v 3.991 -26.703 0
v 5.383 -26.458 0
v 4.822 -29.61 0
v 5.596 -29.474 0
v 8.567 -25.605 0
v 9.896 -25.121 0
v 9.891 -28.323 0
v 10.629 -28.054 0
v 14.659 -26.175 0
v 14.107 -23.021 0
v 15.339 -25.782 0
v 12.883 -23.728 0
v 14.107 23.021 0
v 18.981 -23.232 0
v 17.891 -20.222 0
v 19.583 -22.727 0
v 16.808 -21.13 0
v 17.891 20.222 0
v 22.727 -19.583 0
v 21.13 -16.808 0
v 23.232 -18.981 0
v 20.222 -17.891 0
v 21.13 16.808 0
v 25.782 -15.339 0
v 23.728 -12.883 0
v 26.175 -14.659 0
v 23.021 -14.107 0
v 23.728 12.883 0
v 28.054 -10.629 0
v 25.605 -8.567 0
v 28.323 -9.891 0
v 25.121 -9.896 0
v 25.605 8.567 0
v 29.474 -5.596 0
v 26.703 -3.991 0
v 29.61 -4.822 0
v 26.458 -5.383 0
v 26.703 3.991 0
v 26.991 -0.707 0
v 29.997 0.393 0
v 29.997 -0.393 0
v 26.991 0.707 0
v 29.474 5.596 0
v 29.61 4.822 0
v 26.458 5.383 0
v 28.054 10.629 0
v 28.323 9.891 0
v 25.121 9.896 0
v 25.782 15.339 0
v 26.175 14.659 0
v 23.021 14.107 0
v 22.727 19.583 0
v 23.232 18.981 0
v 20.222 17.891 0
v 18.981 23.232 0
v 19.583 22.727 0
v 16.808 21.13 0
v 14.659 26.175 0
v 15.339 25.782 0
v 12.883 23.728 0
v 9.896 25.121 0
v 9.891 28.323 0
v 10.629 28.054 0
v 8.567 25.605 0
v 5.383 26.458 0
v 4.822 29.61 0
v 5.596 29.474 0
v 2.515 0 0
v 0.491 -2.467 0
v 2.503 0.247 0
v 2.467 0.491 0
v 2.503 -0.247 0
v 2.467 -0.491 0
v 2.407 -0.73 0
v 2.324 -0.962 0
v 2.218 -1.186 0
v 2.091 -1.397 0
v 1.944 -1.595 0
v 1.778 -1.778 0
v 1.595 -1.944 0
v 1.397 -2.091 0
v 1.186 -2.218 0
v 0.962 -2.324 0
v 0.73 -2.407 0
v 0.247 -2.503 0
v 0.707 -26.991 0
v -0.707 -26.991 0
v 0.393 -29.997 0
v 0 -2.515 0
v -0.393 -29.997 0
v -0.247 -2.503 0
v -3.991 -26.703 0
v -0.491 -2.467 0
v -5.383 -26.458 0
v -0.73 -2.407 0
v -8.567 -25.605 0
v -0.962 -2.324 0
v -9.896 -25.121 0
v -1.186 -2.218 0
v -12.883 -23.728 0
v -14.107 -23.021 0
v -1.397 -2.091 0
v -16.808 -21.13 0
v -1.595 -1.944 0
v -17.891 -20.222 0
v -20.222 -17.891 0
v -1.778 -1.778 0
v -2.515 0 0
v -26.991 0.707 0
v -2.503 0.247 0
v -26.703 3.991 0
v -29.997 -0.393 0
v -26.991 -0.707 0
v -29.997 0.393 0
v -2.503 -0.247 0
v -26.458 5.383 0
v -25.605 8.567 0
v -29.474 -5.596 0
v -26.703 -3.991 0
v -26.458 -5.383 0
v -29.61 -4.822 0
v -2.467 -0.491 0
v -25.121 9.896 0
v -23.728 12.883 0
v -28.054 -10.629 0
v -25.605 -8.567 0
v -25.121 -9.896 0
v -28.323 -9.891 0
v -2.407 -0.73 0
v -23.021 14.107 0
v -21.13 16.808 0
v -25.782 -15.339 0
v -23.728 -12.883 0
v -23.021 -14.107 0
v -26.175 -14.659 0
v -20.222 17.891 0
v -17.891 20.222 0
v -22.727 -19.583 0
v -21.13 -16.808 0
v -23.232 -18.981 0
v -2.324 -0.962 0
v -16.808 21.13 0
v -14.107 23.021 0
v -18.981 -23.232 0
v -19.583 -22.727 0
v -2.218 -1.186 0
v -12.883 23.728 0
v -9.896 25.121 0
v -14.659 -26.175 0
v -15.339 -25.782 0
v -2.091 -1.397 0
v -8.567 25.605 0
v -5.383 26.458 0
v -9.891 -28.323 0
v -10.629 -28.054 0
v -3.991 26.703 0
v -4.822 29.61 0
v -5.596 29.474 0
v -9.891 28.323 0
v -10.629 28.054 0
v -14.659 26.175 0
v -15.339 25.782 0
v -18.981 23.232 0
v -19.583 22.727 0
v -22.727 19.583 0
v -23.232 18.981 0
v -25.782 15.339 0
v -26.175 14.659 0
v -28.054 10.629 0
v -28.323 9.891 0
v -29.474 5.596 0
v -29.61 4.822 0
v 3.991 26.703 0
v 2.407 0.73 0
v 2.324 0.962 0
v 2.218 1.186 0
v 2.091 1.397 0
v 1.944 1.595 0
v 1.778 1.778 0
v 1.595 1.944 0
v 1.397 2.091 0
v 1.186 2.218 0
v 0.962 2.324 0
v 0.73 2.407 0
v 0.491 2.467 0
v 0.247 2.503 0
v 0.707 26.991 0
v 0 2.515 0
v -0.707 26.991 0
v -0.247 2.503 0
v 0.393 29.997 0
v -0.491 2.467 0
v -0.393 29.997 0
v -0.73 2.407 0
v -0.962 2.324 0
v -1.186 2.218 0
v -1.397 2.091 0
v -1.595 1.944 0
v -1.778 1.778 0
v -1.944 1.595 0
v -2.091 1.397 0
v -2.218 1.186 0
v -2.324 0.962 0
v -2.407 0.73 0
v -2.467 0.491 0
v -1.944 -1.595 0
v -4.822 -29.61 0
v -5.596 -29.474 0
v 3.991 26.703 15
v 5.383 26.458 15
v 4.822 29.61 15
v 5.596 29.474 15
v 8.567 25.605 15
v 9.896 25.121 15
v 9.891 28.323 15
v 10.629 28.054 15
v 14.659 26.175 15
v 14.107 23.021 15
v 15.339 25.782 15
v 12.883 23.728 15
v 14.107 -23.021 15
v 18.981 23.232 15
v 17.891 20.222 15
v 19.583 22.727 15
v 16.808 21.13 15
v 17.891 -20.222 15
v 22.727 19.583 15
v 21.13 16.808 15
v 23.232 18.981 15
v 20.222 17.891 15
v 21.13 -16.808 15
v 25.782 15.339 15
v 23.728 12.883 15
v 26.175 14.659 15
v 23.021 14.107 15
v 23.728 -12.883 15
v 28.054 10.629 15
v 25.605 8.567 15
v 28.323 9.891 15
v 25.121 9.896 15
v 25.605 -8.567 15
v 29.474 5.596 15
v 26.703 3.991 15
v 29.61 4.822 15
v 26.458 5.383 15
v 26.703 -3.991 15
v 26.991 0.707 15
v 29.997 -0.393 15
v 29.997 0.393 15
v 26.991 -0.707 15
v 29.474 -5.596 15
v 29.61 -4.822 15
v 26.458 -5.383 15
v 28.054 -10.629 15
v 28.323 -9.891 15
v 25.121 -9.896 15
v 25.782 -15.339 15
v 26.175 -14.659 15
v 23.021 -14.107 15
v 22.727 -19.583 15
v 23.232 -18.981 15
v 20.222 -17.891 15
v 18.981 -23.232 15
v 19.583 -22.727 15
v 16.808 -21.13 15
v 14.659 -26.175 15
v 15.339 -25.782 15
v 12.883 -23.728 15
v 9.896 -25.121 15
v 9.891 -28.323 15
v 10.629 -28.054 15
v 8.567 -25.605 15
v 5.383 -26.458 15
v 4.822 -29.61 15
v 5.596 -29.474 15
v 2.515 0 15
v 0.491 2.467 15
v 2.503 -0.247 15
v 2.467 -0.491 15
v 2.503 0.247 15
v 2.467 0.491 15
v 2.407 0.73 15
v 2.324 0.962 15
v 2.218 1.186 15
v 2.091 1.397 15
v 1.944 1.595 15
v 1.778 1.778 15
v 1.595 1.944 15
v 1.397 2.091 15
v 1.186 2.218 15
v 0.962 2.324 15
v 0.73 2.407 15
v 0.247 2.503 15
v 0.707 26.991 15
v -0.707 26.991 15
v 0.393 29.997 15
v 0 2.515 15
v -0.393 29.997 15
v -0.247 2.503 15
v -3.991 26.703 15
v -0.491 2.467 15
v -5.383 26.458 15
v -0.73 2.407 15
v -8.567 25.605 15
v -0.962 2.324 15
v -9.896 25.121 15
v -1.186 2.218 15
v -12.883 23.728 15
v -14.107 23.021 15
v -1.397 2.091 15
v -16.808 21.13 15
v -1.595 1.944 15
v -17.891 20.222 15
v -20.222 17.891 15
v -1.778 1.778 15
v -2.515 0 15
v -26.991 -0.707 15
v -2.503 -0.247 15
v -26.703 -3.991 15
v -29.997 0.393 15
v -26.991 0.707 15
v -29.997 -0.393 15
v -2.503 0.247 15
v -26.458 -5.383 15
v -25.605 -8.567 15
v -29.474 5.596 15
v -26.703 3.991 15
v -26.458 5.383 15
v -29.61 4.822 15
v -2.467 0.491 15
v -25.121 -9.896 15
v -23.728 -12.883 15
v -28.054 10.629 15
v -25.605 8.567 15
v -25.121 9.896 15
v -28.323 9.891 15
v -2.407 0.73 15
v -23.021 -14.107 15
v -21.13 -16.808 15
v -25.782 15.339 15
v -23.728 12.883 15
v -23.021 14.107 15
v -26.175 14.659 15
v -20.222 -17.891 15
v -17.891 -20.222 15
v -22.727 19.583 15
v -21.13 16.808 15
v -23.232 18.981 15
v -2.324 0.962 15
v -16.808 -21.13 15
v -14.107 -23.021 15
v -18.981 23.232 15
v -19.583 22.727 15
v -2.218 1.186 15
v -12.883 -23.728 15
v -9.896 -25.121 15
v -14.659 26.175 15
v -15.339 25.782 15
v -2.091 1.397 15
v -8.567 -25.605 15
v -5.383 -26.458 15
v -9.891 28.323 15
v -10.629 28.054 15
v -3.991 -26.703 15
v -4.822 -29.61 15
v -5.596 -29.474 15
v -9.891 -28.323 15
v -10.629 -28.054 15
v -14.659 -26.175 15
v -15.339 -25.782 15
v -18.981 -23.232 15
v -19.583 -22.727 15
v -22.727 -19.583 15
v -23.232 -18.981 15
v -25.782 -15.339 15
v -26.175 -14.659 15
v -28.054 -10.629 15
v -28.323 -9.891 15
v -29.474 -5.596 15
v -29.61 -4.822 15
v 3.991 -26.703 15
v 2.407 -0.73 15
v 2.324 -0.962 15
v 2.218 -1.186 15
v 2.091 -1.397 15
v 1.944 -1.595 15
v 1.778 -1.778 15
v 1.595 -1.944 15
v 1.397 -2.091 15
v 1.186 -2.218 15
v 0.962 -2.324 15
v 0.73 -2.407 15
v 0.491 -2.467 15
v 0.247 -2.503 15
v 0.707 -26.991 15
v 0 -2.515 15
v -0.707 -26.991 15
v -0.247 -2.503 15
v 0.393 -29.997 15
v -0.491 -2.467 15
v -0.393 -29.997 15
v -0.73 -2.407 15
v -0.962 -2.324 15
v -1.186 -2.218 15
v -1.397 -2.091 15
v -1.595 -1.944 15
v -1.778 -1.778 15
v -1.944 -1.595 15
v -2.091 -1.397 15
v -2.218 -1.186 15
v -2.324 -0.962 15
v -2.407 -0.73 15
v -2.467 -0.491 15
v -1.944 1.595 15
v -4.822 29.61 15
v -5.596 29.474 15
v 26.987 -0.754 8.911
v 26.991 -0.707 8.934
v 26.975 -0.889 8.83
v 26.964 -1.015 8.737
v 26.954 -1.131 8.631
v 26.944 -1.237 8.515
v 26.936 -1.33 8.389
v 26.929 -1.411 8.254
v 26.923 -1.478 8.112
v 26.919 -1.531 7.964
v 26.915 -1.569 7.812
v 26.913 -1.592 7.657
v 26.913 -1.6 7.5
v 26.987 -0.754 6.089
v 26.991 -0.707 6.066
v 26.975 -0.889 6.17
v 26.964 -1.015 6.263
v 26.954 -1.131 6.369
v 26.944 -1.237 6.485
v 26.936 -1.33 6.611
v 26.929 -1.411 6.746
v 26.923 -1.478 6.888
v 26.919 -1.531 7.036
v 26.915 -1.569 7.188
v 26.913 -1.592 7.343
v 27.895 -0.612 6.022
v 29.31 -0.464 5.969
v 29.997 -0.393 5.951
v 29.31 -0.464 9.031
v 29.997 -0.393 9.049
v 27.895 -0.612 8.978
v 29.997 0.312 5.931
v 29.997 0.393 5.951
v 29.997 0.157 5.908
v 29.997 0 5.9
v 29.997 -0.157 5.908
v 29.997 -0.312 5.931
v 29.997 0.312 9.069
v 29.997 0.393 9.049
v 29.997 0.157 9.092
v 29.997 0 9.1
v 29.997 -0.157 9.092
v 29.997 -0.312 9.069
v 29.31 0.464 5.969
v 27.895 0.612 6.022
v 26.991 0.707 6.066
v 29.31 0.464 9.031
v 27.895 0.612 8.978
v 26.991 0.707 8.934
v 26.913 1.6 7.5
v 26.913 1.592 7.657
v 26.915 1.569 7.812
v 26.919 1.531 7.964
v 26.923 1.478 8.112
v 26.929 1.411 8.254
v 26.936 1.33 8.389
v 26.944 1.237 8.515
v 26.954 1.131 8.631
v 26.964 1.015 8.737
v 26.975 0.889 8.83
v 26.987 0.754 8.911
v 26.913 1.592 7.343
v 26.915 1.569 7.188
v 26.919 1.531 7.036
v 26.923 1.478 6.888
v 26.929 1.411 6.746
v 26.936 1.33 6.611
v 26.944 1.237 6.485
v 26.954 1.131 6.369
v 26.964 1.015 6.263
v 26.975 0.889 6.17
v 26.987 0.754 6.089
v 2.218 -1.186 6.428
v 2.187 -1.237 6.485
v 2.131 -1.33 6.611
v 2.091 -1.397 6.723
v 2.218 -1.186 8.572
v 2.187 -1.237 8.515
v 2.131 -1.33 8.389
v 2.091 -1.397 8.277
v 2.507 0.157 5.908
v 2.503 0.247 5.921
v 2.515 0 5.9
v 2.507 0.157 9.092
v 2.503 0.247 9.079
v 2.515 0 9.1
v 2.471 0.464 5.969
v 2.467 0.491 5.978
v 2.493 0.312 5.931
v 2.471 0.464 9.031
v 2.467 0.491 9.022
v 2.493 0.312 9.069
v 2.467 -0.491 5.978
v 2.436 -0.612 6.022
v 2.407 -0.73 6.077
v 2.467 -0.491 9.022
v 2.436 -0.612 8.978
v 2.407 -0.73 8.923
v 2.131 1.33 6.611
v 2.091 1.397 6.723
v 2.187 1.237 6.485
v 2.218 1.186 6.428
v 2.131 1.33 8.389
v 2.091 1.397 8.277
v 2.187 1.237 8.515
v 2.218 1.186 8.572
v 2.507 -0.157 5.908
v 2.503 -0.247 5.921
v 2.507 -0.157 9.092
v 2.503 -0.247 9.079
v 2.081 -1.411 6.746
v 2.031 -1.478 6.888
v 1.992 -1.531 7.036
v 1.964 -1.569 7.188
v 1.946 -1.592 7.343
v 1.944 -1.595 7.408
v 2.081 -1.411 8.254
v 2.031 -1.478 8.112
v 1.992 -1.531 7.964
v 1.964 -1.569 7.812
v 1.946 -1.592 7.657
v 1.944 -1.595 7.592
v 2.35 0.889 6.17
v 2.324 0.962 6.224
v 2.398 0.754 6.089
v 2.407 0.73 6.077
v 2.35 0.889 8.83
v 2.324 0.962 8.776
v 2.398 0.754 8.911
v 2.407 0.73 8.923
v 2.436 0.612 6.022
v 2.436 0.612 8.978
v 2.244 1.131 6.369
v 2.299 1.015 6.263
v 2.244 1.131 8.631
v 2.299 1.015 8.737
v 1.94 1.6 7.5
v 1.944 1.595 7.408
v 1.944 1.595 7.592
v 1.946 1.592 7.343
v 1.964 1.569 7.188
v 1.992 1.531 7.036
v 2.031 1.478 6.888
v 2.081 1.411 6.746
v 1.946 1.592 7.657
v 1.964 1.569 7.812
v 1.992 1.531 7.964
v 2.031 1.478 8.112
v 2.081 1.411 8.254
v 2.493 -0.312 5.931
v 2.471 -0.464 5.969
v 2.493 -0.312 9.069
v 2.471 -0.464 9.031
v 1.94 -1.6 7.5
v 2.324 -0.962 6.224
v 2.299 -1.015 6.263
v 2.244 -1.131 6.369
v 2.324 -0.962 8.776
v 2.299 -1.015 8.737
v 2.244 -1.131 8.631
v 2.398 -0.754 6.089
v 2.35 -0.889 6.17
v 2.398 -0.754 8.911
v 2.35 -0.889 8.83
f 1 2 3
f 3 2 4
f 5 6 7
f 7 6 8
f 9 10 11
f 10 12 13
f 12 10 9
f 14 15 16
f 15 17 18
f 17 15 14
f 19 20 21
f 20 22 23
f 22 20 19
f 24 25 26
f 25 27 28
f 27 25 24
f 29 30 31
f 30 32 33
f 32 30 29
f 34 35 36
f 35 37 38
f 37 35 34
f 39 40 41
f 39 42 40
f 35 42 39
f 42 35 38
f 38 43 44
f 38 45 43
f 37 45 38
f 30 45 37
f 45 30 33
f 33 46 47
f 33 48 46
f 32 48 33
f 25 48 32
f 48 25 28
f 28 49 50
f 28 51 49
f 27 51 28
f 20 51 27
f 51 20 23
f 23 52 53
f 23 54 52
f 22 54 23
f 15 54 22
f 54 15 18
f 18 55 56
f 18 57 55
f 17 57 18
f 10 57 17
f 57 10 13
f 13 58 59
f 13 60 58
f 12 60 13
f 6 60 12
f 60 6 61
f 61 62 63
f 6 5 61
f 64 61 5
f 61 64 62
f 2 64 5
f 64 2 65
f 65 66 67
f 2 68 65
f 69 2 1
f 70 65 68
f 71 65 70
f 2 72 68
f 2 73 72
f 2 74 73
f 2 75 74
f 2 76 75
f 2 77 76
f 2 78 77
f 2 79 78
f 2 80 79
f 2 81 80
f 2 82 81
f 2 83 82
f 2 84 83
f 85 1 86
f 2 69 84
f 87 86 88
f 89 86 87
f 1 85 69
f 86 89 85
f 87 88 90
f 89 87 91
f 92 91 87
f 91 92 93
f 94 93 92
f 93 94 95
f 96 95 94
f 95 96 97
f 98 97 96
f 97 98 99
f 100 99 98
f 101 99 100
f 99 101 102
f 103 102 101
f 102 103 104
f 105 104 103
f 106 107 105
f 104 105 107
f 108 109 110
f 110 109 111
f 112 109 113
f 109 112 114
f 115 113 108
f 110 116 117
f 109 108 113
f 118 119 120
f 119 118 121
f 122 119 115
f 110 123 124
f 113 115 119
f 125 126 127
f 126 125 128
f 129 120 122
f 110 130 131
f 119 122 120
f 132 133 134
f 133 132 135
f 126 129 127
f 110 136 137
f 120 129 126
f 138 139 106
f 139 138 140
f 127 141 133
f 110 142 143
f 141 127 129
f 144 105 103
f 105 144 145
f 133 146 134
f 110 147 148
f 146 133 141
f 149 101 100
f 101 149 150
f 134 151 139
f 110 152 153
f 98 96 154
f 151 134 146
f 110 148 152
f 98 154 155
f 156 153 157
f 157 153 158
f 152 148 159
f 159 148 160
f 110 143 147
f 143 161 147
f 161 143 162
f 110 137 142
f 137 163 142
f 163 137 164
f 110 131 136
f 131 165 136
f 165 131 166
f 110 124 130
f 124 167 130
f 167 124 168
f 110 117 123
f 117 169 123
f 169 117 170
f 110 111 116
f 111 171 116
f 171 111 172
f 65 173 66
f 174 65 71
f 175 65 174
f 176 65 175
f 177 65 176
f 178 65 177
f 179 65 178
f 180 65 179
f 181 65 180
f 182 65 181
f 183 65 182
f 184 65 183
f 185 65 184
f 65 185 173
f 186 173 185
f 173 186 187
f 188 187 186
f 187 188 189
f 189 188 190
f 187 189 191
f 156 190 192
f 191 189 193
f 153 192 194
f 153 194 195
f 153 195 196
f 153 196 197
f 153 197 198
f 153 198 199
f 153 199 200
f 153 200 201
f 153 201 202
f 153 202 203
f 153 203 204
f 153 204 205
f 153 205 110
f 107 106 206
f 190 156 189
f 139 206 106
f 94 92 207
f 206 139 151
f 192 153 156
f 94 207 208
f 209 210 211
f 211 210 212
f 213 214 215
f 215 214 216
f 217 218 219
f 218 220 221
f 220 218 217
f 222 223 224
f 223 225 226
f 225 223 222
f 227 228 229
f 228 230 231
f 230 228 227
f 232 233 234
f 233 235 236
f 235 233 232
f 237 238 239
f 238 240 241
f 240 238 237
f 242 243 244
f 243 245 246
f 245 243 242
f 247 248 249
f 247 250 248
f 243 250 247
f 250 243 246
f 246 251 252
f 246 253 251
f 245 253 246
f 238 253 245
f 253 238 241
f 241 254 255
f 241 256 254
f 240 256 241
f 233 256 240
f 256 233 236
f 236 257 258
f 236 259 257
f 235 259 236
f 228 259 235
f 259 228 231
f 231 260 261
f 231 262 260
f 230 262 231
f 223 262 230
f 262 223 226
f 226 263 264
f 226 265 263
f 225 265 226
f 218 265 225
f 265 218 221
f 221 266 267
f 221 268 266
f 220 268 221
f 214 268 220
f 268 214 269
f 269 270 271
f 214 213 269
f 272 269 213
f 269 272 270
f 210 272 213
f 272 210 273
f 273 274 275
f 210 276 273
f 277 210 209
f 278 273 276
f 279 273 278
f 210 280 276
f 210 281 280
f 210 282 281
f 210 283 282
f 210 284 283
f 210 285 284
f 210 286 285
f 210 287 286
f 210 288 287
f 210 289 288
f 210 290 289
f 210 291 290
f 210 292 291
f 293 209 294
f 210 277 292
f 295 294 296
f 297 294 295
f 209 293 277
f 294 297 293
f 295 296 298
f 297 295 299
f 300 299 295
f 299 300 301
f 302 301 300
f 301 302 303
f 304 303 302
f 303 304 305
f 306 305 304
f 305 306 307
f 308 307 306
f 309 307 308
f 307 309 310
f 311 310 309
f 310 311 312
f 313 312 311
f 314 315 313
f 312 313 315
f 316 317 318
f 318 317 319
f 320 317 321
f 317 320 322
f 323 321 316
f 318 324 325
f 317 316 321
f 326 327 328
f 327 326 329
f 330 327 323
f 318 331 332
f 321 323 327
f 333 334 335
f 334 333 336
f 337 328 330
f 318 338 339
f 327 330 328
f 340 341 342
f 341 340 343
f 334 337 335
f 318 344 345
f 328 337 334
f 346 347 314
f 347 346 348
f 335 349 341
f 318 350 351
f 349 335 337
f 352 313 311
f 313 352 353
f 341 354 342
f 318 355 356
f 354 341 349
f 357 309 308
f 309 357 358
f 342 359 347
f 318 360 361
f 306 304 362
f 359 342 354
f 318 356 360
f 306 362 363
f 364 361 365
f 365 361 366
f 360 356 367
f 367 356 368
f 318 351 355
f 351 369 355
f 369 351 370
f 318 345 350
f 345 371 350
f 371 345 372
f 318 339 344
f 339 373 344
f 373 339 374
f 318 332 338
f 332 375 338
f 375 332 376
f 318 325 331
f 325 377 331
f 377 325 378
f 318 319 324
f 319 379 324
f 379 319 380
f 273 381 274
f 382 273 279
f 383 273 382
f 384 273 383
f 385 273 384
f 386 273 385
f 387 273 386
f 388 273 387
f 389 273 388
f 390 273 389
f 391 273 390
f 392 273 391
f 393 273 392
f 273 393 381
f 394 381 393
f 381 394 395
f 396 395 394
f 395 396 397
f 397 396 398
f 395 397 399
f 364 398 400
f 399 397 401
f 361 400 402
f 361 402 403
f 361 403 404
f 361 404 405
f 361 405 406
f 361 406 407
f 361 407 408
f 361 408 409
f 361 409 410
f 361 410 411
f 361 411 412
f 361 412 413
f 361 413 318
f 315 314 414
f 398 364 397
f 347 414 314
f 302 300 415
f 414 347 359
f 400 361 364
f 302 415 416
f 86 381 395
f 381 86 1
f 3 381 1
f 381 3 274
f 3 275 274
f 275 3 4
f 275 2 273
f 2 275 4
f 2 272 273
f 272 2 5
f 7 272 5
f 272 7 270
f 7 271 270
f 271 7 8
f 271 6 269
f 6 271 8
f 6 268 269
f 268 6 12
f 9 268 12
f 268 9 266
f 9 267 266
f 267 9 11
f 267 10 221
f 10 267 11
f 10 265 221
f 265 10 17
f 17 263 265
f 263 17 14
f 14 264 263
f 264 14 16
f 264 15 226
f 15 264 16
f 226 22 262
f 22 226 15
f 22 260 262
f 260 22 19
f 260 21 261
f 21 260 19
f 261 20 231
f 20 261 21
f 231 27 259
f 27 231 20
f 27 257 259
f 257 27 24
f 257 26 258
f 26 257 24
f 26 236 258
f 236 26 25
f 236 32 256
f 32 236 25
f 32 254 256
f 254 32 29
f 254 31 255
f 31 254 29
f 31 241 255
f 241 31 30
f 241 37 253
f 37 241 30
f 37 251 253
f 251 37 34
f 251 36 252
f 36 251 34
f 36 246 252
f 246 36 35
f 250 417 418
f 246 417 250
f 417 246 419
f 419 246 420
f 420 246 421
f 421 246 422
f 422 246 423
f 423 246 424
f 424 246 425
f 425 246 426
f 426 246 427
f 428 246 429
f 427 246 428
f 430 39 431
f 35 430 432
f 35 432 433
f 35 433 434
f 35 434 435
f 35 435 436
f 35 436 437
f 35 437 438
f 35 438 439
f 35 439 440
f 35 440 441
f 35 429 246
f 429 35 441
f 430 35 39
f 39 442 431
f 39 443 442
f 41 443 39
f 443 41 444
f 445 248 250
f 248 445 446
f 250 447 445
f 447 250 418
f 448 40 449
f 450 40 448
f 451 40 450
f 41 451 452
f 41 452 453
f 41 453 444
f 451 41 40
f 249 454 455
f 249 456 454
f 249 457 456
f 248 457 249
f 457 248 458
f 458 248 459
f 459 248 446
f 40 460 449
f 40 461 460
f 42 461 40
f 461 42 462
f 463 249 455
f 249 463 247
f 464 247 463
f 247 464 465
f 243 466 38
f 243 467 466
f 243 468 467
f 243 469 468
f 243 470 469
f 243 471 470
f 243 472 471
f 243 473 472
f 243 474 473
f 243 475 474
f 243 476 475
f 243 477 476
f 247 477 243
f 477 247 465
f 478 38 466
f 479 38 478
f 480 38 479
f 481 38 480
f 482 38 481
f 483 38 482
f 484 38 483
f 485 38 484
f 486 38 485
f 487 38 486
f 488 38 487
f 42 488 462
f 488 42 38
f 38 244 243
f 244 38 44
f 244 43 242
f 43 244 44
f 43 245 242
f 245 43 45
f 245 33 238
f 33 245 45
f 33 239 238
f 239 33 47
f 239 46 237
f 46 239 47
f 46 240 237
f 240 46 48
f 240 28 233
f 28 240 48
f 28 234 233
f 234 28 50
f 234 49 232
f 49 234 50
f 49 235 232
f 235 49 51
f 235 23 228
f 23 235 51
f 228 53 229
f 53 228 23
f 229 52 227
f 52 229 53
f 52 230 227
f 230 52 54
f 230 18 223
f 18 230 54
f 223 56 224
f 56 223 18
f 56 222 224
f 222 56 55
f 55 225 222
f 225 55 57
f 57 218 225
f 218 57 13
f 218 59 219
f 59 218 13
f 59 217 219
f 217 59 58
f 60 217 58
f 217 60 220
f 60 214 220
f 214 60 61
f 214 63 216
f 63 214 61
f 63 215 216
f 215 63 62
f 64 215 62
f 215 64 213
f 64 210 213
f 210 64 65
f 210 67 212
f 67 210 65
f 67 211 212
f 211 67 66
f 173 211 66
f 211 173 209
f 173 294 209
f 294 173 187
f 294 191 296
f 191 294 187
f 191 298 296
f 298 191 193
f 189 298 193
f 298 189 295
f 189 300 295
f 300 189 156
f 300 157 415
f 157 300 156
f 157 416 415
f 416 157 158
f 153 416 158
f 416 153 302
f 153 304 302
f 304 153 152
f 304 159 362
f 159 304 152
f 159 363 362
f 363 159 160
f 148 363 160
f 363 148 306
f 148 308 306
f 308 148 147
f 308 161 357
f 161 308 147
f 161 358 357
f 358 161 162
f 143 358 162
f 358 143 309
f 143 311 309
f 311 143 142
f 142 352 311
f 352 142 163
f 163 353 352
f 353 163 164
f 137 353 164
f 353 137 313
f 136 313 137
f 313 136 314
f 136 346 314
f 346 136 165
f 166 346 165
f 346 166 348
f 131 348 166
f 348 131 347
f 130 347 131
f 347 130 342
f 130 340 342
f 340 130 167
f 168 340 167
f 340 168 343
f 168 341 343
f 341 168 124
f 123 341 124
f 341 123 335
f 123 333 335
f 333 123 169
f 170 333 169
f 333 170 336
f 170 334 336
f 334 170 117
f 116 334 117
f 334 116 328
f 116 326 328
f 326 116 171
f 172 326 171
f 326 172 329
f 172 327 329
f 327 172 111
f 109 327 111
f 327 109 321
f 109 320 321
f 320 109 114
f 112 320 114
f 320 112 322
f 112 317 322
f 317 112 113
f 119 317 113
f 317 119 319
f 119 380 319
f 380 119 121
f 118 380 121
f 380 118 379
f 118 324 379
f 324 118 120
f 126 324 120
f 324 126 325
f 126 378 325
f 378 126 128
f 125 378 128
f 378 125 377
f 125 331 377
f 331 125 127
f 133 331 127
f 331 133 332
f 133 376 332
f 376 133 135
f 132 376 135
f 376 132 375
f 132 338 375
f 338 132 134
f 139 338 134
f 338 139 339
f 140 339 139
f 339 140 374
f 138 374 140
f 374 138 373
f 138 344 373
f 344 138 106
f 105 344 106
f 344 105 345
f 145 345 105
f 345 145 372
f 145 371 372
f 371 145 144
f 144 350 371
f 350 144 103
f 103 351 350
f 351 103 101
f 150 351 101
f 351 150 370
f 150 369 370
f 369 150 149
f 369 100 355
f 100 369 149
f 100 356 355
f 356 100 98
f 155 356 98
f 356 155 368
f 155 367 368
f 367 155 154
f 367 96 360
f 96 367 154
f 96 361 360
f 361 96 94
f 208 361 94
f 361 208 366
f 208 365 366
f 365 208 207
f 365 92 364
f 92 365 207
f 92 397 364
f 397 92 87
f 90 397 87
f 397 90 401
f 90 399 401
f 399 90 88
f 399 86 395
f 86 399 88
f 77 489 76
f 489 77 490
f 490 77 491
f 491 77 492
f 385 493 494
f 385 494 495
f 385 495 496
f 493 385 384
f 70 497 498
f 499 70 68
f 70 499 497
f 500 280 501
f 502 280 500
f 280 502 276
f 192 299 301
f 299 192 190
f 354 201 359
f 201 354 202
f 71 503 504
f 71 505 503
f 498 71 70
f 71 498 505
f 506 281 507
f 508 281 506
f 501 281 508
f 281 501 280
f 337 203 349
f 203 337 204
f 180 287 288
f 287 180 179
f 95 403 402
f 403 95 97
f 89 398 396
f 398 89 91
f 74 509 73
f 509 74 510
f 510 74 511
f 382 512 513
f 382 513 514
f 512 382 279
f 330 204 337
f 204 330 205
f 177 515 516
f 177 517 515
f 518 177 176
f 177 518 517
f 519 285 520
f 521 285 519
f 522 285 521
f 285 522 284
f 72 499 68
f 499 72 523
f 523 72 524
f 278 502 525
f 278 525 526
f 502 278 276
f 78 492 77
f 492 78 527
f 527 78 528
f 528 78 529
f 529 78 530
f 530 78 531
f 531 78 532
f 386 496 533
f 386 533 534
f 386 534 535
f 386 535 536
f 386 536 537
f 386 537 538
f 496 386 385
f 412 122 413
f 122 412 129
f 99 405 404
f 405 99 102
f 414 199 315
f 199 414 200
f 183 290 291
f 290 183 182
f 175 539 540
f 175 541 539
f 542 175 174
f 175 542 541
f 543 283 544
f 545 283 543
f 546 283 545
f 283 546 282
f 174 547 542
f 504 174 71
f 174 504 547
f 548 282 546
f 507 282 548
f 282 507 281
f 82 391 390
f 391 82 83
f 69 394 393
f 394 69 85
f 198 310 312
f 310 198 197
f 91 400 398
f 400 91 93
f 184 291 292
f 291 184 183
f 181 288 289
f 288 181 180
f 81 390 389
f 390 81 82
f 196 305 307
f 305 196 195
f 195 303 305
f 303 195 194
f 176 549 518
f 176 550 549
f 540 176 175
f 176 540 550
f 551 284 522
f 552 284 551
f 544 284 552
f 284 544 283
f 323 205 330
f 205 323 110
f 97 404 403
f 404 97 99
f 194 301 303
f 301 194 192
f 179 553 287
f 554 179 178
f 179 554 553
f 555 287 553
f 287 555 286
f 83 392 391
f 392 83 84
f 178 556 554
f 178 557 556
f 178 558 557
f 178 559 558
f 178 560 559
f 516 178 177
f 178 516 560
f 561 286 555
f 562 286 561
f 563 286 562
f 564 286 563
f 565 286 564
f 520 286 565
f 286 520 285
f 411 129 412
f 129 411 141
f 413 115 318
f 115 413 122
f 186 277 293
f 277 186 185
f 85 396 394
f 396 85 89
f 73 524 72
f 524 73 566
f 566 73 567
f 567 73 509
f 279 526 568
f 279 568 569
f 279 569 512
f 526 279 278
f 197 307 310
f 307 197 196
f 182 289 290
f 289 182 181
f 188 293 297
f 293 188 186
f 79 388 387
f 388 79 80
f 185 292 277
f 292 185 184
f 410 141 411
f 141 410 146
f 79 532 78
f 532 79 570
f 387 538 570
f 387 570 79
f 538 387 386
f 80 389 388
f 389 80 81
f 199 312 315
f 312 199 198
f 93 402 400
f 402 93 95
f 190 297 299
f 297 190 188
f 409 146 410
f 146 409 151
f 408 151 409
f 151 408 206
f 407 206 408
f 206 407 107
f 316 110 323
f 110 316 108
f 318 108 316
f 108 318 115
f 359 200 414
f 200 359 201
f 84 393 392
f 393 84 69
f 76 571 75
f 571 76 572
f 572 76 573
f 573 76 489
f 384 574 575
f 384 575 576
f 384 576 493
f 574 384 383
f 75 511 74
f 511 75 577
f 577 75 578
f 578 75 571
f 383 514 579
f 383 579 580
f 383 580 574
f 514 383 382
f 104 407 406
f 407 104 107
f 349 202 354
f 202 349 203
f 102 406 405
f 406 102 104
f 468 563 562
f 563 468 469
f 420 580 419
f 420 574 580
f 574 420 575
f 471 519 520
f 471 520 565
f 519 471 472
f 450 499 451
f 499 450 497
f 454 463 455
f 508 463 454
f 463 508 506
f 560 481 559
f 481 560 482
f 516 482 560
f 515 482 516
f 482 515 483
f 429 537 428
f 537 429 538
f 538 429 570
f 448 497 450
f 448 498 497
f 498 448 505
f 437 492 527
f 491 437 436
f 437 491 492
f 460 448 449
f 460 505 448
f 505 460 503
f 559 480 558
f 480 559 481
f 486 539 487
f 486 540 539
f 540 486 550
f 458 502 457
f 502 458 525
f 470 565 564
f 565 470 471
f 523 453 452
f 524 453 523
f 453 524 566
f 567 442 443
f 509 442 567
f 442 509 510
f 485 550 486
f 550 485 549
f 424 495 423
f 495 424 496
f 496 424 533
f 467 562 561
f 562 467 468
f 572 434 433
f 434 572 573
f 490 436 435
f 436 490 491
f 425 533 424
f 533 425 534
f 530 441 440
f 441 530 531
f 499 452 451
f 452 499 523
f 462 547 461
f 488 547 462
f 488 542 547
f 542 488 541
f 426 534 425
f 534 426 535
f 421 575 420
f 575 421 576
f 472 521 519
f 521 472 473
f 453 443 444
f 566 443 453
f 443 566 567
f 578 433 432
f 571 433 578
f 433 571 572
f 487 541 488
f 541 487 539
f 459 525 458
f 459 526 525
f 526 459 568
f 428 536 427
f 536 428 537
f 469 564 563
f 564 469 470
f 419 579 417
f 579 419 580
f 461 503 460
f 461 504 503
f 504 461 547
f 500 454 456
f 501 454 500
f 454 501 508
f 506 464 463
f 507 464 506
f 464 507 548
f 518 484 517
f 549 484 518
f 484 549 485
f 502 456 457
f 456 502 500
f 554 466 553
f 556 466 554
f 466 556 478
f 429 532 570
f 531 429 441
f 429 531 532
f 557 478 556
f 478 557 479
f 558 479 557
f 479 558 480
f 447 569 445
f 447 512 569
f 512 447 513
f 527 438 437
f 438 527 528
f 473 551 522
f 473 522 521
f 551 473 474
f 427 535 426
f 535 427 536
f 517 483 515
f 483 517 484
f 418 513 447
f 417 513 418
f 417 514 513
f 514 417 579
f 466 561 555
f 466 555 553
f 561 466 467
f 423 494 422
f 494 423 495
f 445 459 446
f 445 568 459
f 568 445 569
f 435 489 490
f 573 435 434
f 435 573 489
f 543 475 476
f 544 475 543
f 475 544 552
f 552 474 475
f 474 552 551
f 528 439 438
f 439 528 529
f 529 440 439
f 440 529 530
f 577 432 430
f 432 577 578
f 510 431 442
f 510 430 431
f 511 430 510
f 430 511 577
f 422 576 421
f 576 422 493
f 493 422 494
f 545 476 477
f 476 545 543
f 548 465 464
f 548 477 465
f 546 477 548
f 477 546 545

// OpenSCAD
// FILE: 04_Drive_Gears_Independent.scad

$fn = 64;
mode = "motor"; // CHANGE TO "encoder" TO RENDER THE OTHER ONE

if (mode == "motor") drive_gear(dia = 5.03, is_d = false);
if (mode == "encoder") drive_gear(dia = 6.04, is_d = true);

module drive_gear(dia, is_d) {
    difference() {
        linear_extrude(height = 15) gear_profile(36, 30, 27);
        translate([0,0,-1]) {
            if(is_d) intersection() {
                cylinder(h=17, d=dia);
                translate([-dia/2, -dia/2 + 0.8, 0]) cube([dia, dia, 17]);
            } else cylinder(h=17, d=dia);
        }
        translate([0, 0, 7.5]) rotate([0, 90, 0]) cylinder(h=30, d=3.2);
    }
}

module gear_profile(teeth, r_out, r_in, flat=0.6) {
    angle_step = 360/teeth;
    points = [for (i = [0:teeth-1]) each [
        [r_in*cos(i*angle_step-angle_step*flat/4), r_in*sin(i*angle_step-angle_step*flat/4)],
        [r_out*cos(i*angle_step-angle_step*flat/8), r_out*sin(i*angle_step-angle_step*flat/8)],
        [r_out*cos(i*angle_step+angle_step*flat/8), r_out*sin(i*angle_step+angle_step*flat/8)],
        [r_in*cos(i*angle_step+angle_step*flat/4), r_in*sin(i*angle_step+angle_step*flat/4)]
    ]];
    polygon(points);
}
